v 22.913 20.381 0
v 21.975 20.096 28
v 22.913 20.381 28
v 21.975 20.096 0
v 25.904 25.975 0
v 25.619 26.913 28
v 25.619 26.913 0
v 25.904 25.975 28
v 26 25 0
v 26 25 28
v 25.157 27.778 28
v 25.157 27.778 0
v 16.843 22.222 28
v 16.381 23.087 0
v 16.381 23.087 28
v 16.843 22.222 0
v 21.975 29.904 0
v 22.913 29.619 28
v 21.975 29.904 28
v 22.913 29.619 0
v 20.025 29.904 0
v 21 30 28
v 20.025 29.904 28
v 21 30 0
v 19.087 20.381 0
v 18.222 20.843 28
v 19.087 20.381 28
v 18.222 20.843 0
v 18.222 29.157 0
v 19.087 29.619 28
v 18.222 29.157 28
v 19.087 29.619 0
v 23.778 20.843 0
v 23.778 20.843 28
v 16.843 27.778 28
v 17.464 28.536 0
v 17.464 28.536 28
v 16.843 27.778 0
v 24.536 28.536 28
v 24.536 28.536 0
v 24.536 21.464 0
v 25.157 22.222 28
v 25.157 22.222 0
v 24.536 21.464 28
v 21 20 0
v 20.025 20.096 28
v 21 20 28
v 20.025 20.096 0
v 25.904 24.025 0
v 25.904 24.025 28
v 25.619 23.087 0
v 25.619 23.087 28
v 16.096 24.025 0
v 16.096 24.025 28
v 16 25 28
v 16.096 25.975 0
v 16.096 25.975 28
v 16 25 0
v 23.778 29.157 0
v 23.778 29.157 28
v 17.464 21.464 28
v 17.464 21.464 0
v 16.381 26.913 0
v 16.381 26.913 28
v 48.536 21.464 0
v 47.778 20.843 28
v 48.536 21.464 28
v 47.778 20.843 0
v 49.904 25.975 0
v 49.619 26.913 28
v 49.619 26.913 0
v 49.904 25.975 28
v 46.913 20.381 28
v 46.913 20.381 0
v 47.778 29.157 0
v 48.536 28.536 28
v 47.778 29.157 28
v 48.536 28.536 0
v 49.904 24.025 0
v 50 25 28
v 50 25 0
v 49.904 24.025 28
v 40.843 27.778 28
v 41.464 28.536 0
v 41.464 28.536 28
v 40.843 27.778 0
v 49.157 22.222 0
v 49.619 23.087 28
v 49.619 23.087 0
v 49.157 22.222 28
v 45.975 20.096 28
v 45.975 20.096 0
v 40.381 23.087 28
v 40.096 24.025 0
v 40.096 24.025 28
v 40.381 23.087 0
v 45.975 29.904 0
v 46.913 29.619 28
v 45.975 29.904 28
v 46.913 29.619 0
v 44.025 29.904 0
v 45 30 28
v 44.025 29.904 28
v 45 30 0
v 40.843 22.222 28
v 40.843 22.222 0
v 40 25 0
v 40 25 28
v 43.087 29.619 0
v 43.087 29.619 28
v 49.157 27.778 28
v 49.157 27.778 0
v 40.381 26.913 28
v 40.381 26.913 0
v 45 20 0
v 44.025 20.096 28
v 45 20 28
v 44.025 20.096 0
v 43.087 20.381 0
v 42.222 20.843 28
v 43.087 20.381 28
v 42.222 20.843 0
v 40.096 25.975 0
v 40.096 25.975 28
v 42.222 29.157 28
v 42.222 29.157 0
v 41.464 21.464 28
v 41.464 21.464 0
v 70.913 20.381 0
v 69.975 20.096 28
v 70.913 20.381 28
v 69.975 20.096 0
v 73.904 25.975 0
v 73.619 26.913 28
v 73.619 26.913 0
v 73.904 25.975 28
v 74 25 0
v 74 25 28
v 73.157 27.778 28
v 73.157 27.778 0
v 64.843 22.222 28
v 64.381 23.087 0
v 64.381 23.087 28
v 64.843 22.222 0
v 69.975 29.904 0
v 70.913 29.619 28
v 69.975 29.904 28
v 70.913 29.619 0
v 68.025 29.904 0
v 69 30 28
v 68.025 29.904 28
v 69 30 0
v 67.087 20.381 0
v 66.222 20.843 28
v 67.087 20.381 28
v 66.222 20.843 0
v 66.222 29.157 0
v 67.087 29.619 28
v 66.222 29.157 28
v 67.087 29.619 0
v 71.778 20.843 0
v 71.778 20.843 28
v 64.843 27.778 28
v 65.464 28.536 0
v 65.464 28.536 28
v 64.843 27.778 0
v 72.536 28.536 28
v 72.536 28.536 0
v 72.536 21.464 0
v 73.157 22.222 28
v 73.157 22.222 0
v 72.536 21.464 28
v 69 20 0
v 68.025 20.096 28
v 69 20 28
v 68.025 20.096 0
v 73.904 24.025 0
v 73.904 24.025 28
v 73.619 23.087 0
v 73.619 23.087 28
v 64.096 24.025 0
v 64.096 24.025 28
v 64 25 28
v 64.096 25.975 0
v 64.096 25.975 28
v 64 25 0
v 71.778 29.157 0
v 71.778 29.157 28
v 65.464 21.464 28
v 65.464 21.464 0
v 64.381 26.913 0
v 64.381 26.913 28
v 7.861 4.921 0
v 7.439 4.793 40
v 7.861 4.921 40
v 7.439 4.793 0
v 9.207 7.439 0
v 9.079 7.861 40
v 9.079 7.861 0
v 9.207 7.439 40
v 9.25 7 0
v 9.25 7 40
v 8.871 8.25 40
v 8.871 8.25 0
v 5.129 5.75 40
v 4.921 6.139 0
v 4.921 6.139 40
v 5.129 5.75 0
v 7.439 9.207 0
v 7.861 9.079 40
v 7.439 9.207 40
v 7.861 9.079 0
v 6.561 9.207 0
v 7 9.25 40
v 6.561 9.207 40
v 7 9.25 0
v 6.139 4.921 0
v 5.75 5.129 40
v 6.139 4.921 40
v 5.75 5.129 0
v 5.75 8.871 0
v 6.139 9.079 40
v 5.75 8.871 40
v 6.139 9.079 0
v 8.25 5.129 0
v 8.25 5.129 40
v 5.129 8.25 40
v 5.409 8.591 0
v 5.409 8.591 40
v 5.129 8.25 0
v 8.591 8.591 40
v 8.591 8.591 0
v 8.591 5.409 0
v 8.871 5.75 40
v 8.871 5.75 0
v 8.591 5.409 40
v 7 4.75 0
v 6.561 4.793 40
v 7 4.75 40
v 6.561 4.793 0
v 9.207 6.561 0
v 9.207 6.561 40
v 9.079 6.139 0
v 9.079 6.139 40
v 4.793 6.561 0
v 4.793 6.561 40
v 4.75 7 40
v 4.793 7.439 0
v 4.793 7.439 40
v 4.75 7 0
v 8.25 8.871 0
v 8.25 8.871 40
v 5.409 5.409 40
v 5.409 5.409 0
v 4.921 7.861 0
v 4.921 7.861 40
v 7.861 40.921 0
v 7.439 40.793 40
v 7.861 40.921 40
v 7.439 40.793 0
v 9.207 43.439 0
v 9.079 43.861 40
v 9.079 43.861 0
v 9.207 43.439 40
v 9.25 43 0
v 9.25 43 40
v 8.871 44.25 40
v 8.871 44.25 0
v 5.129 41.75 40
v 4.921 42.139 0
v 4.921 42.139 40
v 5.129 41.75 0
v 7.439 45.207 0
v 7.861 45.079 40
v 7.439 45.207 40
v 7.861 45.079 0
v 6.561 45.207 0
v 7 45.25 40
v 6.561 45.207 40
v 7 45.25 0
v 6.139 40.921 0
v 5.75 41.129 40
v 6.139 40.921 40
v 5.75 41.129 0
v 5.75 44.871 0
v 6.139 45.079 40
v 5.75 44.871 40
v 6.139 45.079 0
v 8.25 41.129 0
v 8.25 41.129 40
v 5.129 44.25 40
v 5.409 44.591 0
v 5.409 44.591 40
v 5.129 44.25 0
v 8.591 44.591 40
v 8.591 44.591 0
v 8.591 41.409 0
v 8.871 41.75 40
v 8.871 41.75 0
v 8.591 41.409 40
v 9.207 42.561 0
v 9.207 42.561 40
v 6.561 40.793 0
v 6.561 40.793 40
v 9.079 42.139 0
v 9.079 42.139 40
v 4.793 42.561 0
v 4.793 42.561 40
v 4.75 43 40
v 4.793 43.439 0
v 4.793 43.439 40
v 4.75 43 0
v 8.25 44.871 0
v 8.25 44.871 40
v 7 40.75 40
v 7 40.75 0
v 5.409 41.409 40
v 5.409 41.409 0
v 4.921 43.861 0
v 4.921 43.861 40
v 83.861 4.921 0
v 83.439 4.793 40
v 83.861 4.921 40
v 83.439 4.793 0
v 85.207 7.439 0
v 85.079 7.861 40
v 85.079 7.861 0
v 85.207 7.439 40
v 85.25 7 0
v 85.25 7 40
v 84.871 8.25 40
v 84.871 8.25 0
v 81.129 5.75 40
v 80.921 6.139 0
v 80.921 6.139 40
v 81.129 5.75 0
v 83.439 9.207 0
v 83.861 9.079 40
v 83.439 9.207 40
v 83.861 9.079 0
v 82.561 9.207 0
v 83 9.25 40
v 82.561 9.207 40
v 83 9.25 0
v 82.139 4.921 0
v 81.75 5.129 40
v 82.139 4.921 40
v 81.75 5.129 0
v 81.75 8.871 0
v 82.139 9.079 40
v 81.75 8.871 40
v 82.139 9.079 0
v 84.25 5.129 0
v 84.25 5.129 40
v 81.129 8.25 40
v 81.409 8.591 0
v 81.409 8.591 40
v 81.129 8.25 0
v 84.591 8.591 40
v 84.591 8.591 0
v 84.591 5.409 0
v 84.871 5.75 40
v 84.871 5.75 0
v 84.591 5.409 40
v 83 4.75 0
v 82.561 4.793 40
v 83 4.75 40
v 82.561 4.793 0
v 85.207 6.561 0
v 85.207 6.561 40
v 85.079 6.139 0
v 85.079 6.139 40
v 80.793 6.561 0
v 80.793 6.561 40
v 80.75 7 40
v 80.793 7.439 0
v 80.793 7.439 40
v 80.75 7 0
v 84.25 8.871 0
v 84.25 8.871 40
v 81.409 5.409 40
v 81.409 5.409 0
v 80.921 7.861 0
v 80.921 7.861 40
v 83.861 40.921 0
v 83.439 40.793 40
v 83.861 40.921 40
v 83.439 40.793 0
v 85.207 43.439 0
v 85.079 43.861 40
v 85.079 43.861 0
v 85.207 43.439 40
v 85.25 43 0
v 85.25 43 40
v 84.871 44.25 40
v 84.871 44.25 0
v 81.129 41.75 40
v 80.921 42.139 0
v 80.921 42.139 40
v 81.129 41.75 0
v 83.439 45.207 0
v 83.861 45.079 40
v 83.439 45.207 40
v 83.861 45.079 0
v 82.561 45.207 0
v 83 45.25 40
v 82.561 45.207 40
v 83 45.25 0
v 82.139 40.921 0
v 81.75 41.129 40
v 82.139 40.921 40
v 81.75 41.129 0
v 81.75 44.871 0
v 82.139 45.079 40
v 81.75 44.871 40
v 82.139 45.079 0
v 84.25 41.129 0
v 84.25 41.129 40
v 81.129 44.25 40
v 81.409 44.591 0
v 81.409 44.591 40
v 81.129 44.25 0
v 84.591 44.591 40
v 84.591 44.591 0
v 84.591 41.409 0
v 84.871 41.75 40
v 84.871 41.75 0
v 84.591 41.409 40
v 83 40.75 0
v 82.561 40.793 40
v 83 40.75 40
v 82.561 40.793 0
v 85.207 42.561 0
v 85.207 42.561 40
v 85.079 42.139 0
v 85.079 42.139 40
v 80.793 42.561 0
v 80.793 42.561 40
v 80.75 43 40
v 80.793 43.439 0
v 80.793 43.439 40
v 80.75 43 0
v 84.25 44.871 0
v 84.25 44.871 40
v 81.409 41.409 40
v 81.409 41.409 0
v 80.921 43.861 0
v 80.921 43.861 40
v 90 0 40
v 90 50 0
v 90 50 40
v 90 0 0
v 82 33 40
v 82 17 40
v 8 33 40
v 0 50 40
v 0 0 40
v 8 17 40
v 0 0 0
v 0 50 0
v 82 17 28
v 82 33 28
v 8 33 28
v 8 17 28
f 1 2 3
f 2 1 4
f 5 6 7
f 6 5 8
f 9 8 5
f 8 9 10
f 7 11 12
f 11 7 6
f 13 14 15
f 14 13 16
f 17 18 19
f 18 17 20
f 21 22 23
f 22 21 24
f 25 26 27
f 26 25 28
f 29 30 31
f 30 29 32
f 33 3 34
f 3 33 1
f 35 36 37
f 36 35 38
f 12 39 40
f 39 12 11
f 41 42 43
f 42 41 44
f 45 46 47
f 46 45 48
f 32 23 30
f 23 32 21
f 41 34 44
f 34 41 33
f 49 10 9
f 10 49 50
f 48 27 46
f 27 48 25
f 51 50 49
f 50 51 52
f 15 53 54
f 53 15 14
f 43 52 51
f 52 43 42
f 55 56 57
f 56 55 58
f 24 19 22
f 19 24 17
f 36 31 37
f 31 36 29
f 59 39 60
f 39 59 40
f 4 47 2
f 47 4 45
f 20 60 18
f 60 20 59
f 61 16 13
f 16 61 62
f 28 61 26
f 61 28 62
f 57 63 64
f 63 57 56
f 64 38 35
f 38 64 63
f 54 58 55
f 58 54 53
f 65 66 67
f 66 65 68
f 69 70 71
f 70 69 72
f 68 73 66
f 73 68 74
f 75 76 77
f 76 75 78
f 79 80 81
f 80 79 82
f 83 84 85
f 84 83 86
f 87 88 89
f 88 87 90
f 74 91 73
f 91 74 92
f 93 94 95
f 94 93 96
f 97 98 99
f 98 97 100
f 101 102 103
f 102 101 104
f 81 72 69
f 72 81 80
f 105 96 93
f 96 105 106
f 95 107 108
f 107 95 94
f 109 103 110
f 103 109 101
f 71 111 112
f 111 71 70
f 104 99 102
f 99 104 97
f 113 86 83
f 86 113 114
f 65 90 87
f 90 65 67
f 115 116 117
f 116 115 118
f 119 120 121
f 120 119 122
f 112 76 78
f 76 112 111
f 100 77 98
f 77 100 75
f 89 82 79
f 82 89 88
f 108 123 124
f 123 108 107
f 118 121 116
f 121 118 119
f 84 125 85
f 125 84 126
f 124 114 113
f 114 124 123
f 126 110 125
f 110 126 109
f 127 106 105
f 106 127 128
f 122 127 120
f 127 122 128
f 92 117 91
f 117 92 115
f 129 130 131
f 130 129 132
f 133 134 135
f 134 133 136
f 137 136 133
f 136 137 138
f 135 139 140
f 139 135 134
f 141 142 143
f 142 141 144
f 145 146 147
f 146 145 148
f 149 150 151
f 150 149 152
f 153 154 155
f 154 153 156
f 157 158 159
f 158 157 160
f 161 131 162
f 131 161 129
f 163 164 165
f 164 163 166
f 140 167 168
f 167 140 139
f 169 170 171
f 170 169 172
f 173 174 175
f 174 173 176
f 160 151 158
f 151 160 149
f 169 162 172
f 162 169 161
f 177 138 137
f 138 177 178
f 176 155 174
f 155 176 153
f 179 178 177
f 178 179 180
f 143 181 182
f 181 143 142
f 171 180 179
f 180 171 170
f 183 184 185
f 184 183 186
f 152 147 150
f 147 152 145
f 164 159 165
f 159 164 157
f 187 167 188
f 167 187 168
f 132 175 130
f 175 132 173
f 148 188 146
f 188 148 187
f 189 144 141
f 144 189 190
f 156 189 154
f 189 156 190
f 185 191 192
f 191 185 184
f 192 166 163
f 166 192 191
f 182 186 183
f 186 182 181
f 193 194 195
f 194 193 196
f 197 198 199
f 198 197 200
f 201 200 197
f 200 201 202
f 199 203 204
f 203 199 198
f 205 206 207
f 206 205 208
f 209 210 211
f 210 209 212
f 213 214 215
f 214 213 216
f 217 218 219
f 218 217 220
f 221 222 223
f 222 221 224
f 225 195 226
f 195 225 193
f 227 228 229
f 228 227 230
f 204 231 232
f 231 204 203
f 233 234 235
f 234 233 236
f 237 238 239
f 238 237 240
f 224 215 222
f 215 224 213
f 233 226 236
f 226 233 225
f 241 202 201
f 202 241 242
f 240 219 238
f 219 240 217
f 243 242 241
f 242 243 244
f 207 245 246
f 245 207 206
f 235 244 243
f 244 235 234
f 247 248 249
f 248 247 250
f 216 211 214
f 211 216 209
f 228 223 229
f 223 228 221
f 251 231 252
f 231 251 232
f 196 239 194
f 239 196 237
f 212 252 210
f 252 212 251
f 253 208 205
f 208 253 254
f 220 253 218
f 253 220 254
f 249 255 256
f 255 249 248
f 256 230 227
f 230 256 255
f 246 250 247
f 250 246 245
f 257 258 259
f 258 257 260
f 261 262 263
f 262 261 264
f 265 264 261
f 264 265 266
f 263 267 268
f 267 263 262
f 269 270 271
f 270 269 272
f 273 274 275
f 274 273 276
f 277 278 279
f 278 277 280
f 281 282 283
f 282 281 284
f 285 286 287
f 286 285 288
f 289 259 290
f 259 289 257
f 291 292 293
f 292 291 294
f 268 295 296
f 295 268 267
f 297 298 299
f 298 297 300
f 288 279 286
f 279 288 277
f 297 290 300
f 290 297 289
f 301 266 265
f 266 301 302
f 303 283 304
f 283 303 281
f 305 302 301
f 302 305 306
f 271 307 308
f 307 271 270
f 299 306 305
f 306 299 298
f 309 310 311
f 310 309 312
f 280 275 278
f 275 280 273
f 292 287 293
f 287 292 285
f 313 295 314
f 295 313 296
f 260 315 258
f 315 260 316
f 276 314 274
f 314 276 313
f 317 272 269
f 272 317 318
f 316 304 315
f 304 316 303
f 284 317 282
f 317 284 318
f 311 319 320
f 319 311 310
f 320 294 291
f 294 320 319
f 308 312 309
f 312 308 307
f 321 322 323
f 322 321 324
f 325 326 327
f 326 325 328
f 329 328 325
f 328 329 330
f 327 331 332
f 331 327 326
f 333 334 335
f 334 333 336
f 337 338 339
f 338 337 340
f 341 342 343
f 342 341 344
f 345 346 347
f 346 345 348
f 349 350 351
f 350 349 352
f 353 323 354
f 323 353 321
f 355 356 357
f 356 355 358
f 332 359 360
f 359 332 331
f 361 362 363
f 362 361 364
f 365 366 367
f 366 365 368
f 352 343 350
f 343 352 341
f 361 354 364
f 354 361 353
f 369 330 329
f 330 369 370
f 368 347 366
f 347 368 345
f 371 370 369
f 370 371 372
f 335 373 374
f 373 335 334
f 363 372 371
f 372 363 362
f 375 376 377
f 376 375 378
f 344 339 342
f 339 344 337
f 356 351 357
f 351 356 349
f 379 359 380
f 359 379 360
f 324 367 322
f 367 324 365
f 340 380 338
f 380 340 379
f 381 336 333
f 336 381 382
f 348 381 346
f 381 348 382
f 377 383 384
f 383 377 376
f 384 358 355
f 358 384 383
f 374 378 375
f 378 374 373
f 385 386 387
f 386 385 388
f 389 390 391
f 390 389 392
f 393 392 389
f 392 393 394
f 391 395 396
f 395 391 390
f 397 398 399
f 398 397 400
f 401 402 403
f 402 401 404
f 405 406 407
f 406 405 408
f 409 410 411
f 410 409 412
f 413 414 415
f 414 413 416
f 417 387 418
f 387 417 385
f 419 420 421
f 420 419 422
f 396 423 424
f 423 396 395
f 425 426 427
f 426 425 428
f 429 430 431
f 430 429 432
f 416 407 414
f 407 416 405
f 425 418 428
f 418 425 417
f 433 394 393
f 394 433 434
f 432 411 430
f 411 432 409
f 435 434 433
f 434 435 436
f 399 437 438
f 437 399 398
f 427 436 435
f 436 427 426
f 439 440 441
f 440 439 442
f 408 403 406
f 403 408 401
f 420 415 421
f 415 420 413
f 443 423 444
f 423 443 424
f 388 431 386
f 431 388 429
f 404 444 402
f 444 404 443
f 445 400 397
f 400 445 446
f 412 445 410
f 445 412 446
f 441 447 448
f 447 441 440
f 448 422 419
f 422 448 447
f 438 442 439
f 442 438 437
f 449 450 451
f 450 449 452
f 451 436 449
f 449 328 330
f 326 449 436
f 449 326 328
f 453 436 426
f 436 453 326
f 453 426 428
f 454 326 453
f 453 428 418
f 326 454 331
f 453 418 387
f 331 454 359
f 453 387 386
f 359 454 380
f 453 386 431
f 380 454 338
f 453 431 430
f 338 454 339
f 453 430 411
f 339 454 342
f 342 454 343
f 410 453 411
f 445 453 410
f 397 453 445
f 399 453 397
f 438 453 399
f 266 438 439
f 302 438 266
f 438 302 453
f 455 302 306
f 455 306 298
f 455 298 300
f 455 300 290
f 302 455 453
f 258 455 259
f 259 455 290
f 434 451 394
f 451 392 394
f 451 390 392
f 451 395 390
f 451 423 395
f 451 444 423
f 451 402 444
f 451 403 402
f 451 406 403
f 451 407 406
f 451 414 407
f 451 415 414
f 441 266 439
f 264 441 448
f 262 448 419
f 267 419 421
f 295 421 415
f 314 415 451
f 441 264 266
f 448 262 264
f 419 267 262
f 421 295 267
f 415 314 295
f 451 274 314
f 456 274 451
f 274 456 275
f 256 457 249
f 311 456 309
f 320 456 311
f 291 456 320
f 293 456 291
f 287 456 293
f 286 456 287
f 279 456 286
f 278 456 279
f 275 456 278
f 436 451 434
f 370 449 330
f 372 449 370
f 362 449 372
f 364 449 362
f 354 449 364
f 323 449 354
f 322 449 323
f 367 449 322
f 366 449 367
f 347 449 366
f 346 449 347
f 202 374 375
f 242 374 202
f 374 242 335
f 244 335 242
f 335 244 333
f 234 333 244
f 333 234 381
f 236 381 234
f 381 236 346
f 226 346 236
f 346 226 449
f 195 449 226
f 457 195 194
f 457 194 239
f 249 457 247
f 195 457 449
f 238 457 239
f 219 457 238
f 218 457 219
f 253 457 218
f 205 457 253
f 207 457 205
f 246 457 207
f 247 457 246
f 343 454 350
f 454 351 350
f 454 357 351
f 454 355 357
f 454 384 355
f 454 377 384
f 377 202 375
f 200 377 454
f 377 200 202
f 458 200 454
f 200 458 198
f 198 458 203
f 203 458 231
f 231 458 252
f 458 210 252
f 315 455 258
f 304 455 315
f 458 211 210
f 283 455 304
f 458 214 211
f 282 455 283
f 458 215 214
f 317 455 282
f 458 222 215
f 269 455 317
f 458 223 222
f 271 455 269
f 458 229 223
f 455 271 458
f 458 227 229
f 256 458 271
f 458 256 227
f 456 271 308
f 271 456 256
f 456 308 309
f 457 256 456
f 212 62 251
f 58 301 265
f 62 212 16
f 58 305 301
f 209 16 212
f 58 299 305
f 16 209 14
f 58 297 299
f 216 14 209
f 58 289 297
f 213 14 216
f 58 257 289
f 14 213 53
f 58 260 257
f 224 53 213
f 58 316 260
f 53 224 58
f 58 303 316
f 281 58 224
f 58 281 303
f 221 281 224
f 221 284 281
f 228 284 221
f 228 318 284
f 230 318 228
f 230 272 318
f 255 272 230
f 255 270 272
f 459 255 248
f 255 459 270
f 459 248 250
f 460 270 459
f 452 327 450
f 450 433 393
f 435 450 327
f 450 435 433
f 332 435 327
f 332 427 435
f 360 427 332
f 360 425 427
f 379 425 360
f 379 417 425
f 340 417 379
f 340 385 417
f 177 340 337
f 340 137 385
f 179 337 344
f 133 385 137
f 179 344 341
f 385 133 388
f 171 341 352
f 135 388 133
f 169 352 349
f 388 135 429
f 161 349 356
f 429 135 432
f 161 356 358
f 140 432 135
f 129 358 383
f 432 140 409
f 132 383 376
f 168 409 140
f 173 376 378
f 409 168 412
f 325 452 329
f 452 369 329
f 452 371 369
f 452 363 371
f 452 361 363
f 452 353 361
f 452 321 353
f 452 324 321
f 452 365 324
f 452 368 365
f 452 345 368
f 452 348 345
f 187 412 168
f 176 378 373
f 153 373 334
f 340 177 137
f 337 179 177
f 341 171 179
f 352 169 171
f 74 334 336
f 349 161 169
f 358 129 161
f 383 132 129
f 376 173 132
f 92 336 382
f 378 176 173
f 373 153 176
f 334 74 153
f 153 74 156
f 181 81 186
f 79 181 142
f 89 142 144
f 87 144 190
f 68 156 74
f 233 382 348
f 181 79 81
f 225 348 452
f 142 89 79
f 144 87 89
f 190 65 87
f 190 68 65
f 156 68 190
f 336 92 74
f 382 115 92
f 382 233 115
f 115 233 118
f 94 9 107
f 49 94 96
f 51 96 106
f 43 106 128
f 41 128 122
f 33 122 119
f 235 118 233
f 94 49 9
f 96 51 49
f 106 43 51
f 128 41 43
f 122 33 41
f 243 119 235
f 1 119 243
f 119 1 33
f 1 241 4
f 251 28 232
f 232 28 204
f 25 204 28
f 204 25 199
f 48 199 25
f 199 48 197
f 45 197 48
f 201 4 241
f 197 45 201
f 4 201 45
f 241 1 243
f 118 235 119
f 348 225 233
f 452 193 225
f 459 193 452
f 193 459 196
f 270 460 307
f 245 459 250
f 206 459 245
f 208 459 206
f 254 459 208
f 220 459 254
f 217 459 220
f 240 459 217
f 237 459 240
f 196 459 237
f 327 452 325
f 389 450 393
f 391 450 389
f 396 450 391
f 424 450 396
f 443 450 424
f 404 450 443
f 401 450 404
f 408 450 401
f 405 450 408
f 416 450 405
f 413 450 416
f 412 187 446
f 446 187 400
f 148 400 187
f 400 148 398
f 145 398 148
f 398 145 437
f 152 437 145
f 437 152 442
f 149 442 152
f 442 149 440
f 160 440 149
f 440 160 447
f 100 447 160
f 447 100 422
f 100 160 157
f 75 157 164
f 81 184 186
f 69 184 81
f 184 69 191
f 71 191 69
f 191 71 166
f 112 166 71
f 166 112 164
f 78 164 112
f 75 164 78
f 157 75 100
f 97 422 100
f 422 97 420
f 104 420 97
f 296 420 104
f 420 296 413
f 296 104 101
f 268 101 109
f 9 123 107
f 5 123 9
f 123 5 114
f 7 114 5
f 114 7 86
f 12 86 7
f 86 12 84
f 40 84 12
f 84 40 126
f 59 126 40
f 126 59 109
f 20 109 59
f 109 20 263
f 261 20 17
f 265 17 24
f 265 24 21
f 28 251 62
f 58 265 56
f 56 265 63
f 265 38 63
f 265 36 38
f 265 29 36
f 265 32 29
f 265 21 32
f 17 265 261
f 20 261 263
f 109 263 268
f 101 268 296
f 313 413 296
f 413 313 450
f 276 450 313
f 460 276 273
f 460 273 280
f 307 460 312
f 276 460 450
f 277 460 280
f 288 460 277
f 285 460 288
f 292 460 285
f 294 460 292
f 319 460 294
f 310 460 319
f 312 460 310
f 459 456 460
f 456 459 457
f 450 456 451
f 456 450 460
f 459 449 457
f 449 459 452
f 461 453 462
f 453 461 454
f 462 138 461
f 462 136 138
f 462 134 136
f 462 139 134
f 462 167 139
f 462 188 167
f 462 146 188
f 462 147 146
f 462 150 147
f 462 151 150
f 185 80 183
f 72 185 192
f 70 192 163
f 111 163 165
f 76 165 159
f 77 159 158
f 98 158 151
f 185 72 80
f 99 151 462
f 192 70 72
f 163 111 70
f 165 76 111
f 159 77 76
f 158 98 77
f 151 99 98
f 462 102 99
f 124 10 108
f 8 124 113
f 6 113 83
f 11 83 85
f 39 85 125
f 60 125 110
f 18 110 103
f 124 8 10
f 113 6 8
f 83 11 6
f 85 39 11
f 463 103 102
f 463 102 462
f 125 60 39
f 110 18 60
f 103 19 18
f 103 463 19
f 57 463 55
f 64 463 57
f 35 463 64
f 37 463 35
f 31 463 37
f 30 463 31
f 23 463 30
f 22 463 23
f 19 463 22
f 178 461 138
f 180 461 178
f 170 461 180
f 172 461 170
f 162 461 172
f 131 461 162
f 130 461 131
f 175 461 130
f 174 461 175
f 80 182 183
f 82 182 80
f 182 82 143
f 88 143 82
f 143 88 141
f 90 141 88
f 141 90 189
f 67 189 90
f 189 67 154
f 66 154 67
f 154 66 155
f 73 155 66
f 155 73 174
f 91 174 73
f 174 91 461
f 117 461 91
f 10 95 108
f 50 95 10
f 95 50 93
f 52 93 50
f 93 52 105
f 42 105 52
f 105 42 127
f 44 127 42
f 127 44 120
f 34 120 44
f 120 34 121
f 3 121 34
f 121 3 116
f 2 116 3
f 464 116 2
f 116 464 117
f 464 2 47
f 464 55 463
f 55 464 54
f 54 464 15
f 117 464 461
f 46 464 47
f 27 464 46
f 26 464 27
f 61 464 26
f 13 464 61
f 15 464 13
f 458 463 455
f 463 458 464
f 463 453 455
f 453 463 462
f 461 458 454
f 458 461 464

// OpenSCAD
$fn = 32;

// ----------------------------------------------------------------------
// Manifold block: gallery_top manifold
// ----------------------------------------------------------------------

// --- parameters (mm) ---
block_l = 90;             // block length, X
block_w = 50;             // block width, Y
block_h = 40;             // block height, Z
port_d = 10;              // port bore diameter
port_pitch = 24;          // port pitch along X
gallery_d = 16;           // top gallery width, Y
gallery_depth = 12;       // gallery pocket depth
wall_p = 8;               // gallery end wall thickness, X
mnt_d = 4.5;              // mounting hole diameter
mnt_in = 7;               // mounting hole inset from the edges

n_ports = 3;  // ports in the row
port_x0 = (block_l - (n_ports - 1) * port_pitch) / 2;  // first port X

difference() {
  cube([block_l, block_w, block_h]);
  for (i = [0 : n_ports - 1])
    translate([port_x0 + i * port_pitch, block_w / 2, -1])
      cylinder(h = block_h + 2, d = port_d);
  translate([wall_p, block_w / 2 - gallery_d / 2, block_h - gallery_depth])
    cube([block_l - 2 * wall_p, gallery_d, gallery_depth + 1]);
  for (cx = [mnt_in, block_l - mnt_in])
    for (cy = [mnt_in, block_w - mnt_in])
      translate([cx, cy, -1]) cylinder(h = block_h + 2, d = mnt_d);
}
